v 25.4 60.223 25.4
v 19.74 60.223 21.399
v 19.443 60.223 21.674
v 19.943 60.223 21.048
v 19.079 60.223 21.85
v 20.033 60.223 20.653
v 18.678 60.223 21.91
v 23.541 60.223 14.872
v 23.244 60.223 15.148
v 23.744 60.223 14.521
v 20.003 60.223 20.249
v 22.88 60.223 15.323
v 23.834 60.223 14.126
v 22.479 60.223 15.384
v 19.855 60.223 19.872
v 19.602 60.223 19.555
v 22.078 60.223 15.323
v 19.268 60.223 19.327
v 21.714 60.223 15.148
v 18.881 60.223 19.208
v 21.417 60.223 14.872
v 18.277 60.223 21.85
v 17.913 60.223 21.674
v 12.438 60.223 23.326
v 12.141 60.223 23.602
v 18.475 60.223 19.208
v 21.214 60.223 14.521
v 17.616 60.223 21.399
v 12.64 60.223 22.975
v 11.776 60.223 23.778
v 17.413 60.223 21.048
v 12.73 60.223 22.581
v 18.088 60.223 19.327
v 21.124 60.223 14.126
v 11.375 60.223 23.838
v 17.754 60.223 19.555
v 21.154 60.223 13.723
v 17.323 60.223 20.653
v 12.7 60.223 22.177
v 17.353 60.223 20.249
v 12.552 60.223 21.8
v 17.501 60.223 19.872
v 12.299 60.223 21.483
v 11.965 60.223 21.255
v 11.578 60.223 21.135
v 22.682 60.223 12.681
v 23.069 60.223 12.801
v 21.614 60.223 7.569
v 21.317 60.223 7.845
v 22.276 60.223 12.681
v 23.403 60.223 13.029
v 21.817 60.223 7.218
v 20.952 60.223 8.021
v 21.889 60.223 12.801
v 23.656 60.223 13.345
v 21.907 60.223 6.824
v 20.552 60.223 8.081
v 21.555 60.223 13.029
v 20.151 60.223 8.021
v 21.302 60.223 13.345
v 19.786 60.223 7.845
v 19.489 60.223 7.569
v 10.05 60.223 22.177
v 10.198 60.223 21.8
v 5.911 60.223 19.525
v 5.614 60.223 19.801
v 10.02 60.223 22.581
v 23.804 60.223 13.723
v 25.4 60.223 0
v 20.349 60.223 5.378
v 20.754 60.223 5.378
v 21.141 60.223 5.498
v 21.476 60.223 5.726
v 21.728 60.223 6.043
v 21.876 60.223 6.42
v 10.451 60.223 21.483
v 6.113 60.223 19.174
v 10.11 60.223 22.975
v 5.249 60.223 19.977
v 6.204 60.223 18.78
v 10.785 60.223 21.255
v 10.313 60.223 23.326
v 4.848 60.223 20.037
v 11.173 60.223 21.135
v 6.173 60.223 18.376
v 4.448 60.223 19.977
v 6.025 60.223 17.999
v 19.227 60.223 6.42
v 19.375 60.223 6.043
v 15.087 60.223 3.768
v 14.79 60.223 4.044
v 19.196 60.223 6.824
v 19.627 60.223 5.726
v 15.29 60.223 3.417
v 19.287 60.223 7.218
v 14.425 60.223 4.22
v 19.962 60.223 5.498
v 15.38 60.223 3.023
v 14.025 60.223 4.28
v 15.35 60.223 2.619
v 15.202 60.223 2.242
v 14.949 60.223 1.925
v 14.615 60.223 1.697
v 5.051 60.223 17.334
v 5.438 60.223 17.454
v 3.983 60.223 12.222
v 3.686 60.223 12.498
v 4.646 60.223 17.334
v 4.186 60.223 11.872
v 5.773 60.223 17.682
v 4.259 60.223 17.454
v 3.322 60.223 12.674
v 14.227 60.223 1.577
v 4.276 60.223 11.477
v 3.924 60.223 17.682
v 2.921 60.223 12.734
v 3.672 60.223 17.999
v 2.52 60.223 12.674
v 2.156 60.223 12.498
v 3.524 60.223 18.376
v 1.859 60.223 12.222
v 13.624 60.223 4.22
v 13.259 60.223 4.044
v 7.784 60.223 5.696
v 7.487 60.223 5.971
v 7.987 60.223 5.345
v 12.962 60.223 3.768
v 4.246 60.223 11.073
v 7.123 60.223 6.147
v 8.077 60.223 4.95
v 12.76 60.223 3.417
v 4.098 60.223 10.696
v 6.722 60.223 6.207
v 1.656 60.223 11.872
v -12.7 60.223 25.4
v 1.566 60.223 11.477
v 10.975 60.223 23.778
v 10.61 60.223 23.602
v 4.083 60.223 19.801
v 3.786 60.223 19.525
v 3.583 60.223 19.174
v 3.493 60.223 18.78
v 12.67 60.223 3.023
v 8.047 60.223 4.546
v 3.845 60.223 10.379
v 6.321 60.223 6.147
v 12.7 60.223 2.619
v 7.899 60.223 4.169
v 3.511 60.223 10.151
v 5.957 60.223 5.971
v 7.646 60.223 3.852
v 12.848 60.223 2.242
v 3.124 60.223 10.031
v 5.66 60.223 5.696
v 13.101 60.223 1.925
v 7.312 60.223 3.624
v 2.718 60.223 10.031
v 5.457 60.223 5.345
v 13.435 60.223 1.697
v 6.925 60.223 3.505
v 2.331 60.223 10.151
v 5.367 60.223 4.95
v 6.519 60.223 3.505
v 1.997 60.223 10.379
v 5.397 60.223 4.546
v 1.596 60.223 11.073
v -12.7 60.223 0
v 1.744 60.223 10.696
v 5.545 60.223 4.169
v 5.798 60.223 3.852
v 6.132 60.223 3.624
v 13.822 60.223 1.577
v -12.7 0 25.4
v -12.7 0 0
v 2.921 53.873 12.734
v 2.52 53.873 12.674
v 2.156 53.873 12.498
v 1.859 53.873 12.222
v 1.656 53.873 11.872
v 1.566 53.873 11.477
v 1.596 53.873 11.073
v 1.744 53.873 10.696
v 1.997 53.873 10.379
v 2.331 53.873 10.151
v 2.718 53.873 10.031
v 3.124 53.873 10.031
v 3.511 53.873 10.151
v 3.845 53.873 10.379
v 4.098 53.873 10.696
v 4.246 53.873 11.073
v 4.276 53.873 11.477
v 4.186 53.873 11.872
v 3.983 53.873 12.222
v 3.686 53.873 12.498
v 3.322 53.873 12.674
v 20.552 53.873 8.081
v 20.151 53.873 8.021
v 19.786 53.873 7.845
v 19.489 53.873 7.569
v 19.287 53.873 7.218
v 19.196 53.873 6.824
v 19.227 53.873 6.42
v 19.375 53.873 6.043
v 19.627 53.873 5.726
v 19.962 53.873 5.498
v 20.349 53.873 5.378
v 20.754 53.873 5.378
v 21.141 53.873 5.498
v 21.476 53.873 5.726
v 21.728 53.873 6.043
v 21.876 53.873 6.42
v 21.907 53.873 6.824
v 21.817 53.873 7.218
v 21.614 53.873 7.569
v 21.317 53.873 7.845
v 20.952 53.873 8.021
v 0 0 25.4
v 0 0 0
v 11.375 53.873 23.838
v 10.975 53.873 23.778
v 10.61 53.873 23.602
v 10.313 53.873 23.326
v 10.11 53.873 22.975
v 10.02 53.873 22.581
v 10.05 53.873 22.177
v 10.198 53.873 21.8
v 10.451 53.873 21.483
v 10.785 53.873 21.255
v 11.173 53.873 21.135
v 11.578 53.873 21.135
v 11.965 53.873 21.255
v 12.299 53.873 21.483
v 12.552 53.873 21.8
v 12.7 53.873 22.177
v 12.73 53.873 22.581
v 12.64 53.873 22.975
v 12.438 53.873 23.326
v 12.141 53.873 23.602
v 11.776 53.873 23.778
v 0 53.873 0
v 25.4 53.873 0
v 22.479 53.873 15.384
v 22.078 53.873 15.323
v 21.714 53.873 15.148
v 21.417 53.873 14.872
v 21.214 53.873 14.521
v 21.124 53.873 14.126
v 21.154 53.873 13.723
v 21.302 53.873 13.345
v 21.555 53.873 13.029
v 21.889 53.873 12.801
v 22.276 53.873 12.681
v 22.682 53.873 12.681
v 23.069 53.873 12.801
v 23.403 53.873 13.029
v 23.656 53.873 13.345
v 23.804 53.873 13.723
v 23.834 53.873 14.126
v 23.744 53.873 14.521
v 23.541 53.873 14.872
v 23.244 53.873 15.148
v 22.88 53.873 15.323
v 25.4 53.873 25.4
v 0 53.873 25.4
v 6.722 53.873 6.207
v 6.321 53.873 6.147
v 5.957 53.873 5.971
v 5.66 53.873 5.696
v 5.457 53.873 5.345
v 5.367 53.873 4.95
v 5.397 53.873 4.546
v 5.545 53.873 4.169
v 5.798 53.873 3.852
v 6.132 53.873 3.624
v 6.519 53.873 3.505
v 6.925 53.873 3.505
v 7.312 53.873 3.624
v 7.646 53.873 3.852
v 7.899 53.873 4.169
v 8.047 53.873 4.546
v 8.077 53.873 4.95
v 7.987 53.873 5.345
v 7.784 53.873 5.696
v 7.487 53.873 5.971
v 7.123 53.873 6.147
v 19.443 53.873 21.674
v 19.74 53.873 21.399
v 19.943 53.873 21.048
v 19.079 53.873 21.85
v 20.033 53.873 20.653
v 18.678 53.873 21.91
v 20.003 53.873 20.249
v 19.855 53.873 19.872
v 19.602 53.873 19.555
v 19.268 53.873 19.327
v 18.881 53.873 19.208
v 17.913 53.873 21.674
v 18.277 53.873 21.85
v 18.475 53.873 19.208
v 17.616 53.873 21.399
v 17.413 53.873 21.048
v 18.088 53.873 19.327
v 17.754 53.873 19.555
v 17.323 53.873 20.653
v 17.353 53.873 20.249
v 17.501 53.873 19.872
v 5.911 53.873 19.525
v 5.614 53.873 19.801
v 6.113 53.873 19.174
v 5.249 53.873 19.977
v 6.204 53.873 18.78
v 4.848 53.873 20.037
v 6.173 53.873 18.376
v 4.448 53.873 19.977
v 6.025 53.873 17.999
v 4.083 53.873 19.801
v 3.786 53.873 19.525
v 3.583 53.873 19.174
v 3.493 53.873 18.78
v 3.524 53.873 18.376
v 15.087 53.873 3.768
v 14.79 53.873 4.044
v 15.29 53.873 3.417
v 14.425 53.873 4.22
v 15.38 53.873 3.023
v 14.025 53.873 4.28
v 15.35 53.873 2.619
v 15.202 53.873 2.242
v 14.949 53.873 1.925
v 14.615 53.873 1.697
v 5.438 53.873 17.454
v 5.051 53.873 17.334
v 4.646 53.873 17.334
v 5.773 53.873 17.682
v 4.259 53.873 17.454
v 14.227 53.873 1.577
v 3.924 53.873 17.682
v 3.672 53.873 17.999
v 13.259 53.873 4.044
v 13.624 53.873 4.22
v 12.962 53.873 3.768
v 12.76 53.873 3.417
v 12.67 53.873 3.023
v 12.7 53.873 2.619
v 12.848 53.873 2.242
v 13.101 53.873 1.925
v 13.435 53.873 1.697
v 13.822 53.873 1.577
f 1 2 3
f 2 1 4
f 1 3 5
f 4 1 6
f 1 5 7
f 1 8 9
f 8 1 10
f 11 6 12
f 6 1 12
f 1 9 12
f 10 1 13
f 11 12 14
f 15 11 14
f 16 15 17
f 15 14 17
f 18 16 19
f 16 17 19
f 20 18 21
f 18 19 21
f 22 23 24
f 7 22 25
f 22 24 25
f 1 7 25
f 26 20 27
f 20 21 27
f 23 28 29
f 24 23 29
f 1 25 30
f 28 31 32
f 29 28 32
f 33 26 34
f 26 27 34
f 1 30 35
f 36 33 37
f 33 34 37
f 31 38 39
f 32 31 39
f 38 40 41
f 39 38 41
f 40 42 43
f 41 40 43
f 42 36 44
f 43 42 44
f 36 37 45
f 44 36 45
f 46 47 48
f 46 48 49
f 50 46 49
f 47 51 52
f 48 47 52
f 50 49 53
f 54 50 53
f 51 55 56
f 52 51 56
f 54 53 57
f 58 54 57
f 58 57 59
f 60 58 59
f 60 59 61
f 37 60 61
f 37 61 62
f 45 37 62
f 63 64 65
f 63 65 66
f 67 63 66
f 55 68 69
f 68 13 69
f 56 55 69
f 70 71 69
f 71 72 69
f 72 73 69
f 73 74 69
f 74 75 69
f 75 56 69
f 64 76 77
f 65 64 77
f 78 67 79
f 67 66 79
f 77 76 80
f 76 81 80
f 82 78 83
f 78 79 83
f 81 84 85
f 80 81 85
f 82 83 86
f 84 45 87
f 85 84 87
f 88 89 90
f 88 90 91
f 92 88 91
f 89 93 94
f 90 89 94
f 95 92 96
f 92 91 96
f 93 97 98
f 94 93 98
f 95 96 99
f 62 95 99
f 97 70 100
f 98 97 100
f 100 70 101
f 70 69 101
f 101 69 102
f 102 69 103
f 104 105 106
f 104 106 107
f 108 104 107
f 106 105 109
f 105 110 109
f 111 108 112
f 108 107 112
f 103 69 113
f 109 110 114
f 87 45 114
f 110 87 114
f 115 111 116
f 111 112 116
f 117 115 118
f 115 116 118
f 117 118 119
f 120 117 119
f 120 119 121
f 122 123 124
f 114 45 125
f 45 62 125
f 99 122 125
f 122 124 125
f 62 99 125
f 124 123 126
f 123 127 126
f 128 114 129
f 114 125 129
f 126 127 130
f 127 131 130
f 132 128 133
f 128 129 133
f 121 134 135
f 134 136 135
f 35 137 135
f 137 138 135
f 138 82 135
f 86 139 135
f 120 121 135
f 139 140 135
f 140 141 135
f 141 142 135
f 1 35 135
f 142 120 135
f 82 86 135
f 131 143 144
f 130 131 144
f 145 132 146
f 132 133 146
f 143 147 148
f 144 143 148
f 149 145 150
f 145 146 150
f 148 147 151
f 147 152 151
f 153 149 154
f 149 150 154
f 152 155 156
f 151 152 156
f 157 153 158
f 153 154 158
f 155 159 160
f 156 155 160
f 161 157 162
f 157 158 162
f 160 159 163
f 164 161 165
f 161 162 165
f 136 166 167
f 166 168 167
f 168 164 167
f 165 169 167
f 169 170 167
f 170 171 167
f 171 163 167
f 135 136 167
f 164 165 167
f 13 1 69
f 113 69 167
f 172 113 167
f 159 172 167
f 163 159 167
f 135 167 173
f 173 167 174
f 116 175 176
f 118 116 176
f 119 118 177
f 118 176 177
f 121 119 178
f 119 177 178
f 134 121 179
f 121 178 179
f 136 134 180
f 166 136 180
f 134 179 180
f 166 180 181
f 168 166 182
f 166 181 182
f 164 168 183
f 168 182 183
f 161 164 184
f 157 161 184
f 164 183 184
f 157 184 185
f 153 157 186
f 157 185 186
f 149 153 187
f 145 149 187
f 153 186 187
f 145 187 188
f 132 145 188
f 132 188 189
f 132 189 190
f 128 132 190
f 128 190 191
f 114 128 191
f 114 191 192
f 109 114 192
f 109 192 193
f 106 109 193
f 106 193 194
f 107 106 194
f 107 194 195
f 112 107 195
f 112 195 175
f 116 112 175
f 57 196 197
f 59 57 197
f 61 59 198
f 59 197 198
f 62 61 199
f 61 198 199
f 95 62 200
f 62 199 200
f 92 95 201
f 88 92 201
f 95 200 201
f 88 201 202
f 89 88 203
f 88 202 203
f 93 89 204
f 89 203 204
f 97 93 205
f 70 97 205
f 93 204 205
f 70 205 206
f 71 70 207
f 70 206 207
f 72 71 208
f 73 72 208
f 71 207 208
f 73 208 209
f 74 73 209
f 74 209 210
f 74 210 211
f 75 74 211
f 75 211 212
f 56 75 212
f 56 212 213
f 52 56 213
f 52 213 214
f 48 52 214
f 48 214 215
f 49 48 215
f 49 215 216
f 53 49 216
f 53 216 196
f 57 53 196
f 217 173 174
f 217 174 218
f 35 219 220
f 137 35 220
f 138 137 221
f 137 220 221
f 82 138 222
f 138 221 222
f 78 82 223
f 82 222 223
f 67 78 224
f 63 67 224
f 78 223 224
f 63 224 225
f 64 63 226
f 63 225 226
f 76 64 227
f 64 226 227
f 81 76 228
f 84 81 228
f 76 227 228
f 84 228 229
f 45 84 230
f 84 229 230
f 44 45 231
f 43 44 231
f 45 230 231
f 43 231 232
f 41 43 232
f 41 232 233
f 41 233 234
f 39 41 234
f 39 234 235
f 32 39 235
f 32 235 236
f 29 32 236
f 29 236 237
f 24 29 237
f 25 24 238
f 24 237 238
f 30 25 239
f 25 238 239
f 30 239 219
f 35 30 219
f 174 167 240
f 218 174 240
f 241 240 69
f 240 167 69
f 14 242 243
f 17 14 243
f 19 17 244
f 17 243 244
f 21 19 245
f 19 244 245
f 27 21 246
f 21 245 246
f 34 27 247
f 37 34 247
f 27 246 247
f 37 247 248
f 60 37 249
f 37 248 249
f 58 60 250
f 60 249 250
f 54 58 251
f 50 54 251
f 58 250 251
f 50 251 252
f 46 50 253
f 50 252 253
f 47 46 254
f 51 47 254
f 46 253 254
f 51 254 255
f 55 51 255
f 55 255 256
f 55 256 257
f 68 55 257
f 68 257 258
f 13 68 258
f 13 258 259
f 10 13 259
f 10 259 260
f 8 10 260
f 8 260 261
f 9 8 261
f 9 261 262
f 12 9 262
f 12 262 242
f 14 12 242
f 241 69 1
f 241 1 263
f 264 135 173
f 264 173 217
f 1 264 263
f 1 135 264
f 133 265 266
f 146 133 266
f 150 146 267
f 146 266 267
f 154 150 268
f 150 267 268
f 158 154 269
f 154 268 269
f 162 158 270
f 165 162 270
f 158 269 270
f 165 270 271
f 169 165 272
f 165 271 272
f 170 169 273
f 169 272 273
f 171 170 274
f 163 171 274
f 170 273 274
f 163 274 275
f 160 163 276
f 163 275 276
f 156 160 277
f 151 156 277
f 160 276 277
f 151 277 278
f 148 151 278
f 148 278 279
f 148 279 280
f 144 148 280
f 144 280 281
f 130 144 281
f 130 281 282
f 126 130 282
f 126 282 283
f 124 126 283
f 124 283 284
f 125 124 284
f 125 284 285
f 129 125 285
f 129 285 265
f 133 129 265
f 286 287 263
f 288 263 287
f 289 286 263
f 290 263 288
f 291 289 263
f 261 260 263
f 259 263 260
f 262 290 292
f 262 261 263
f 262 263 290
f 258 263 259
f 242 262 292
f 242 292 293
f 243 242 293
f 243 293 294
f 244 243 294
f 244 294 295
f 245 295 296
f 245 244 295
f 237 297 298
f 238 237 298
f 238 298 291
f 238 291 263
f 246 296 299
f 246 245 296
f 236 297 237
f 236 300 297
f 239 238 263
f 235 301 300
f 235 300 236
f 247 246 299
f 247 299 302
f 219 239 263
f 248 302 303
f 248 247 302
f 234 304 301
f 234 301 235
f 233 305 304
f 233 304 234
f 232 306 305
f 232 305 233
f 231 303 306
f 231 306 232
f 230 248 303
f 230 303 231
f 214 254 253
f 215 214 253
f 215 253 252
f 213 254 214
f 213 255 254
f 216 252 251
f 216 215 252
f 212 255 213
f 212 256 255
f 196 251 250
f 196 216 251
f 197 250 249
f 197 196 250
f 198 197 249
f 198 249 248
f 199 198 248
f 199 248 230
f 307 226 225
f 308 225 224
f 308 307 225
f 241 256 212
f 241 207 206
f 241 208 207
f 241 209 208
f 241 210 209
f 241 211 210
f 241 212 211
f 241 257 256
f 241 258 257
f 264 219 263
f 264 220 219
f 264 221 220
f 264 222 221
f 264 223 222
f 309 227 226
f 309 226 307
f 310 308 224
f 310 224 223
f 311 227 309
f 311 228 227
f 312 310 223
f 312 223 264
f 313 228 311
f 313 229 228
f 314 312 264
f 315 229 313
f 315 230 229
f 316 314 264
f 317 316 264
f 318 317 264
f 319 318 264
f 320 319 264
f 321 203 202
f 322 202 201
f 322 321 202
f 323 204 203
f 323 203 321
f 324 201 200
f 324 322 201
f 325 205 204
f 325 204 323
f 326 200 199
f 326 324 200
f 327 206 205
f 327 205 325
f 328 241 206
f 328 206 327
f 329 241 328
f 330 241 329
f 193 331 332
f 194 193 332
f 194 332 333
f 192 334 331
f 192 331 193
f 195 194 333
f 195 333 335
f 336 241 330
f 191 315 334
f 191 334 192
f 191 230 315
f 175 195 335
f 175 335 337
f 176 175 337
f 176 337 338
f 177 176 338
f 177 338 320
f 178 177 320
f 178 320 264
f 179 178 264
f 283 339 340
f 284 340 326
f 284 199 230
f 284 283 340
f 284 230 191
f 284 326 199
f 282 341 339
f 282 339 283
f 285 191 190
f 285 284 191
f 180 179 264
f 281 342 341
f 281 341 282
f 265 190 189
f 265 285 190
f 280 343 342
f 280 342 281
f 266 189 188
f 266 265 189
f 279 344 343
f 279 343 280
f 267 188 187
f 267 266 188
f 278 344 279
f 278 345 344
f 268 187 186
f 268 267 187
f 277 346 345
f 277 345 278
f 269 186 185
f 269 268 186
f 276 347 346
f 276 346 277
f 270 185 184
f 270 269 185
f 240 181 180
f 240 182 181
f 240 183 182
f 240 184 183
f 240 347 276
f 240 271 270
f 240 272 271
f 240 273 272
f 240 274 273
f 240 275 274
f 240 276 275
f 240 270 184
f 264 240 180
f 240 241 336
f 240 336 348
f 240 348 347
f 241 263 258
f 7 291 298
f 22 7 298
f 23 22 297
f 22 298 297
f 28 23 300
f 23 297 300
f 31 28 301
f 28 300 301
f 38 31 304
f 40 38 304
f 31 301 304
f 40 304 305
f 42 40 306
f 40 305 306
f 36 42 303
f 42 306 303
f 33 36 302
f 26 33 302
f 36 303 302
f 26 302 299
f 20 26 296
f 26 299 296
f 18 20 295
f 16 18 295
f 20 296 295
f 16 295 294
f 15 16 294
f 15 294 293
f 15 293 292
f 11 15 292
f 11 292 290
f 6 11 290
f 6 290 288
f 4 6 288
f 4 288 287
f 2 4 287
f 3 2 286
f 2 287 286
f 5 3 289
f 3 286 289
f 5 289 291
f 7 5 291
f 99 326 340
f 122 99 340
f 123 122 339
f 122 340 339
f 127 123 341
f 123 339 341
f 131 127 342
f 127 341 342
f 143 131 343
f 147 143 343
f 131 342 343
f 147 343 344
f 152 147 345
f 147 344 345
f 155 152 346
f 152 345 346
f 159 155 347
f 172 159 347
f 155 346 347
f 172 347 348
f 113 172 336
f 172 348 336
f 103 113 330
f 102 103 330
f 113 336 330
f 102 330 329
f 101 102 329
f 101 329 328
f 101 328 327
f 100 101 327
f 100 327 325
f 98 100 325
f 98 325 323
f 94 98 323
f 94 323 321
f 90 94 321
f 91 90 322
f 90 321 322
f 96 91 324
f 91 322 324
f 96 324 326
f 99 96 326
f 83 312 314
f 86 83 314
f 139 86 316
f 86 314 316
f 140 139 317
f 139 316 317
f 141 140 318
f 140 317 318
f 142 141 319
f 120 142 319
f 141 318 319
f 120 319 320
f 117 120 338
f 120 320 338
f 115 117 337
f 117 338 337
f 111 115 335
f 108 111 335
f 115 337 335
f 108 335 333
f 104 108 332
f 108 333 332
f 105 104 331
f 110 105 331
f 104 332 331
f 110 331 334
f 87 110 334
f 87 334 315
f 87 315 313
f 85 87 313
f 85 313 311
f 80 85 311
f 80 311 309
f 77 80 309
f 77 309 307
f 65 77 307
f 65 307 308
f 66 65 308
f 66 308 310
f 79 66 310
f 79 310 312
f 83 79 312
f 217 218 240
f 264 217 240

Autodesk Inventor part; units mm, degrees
ref_plane "YZ Plane" through (0, 0, 0) normal (1, 0, 0) x (0, 1, 0)
ref_plane "XZ Plane" through (0, 0, 0) normal (0, 1, 0) x (-1, 0, 0)
ref_plane "XY Plane" through (0, 0, 0) normal (0, 0, 1) x (1, 0, 0)
sketch "Sketch4" plane through (0, 0, 0) normal (0, 0, 1) x (1, 0, 0)
  line L0 (0, 0) -> (0, 60.2234)
  line L1 (0, 60.2234) -> (25.4, 60.2234)
  line L2 (25.4, 60.2234) -> (25.4, 53.8734)
  line L3 (25.4, 53.8734) -> (0, 53.8734)
  line L4 (0, 60.2234) -> (-12.7, 60.2234)
  line L5 (-12.7, 60.2234) -> (-12.7, 0)
  line L6 (-12.7, 0) -> (0, 0)
  dimension "d25" = 60.2234
  dimension "d26" = 6.35
  dimension "d27" = 25.4
  dimension "d28" = 12.7
extrude "Extrusion3" add sketch "Sketch4" along normal blind 25.4
sketch "Sketch5" plane through (-12.7, 60.2234, 0) normal (0, 1, 0) x (1, 0, 0)
  line L0 (38.1, 0) -> (38.1, -25.4) projected
  line L1 (38.1, -25.4) -> (0, -25.4) projected
  point P0 (25.4, -12.7)
  point P1 (15.621, -11.3751)
  point P2 (17.5484, -18.678)
  point P3 (24.0751, -22.479)
  point P4 (31.378, -20.5516)
  point P5 (35.179, -14.0249)
  point P6 (33.2516, -6.722)
  point P7 (26.7249, -2.921)
  point P8 (19.422, -4.8484)
  dimension "d36" = 360
  dimension "d45" = 9.779
  dimension "d46" = 12.7
  dimension "d47" = 12.7
hole "Hole2" at (2.921, 60.2234, 11.3751) at (4.8484, 60.2234, 18.678) at (11.3751, 60.2234, 22.479) at (18.678, 60.2234, 20.5516) at (22.479, 60.2234, 14.0249) at (20.5516, 60.2234, 6.722) at (14.0249, 60.2234, 2.921) at (6.722, 60.2234, 4.8484) direction (0, -1, 0) diameter 2.7178 end through all
properties part number "wheel arm stand off"
